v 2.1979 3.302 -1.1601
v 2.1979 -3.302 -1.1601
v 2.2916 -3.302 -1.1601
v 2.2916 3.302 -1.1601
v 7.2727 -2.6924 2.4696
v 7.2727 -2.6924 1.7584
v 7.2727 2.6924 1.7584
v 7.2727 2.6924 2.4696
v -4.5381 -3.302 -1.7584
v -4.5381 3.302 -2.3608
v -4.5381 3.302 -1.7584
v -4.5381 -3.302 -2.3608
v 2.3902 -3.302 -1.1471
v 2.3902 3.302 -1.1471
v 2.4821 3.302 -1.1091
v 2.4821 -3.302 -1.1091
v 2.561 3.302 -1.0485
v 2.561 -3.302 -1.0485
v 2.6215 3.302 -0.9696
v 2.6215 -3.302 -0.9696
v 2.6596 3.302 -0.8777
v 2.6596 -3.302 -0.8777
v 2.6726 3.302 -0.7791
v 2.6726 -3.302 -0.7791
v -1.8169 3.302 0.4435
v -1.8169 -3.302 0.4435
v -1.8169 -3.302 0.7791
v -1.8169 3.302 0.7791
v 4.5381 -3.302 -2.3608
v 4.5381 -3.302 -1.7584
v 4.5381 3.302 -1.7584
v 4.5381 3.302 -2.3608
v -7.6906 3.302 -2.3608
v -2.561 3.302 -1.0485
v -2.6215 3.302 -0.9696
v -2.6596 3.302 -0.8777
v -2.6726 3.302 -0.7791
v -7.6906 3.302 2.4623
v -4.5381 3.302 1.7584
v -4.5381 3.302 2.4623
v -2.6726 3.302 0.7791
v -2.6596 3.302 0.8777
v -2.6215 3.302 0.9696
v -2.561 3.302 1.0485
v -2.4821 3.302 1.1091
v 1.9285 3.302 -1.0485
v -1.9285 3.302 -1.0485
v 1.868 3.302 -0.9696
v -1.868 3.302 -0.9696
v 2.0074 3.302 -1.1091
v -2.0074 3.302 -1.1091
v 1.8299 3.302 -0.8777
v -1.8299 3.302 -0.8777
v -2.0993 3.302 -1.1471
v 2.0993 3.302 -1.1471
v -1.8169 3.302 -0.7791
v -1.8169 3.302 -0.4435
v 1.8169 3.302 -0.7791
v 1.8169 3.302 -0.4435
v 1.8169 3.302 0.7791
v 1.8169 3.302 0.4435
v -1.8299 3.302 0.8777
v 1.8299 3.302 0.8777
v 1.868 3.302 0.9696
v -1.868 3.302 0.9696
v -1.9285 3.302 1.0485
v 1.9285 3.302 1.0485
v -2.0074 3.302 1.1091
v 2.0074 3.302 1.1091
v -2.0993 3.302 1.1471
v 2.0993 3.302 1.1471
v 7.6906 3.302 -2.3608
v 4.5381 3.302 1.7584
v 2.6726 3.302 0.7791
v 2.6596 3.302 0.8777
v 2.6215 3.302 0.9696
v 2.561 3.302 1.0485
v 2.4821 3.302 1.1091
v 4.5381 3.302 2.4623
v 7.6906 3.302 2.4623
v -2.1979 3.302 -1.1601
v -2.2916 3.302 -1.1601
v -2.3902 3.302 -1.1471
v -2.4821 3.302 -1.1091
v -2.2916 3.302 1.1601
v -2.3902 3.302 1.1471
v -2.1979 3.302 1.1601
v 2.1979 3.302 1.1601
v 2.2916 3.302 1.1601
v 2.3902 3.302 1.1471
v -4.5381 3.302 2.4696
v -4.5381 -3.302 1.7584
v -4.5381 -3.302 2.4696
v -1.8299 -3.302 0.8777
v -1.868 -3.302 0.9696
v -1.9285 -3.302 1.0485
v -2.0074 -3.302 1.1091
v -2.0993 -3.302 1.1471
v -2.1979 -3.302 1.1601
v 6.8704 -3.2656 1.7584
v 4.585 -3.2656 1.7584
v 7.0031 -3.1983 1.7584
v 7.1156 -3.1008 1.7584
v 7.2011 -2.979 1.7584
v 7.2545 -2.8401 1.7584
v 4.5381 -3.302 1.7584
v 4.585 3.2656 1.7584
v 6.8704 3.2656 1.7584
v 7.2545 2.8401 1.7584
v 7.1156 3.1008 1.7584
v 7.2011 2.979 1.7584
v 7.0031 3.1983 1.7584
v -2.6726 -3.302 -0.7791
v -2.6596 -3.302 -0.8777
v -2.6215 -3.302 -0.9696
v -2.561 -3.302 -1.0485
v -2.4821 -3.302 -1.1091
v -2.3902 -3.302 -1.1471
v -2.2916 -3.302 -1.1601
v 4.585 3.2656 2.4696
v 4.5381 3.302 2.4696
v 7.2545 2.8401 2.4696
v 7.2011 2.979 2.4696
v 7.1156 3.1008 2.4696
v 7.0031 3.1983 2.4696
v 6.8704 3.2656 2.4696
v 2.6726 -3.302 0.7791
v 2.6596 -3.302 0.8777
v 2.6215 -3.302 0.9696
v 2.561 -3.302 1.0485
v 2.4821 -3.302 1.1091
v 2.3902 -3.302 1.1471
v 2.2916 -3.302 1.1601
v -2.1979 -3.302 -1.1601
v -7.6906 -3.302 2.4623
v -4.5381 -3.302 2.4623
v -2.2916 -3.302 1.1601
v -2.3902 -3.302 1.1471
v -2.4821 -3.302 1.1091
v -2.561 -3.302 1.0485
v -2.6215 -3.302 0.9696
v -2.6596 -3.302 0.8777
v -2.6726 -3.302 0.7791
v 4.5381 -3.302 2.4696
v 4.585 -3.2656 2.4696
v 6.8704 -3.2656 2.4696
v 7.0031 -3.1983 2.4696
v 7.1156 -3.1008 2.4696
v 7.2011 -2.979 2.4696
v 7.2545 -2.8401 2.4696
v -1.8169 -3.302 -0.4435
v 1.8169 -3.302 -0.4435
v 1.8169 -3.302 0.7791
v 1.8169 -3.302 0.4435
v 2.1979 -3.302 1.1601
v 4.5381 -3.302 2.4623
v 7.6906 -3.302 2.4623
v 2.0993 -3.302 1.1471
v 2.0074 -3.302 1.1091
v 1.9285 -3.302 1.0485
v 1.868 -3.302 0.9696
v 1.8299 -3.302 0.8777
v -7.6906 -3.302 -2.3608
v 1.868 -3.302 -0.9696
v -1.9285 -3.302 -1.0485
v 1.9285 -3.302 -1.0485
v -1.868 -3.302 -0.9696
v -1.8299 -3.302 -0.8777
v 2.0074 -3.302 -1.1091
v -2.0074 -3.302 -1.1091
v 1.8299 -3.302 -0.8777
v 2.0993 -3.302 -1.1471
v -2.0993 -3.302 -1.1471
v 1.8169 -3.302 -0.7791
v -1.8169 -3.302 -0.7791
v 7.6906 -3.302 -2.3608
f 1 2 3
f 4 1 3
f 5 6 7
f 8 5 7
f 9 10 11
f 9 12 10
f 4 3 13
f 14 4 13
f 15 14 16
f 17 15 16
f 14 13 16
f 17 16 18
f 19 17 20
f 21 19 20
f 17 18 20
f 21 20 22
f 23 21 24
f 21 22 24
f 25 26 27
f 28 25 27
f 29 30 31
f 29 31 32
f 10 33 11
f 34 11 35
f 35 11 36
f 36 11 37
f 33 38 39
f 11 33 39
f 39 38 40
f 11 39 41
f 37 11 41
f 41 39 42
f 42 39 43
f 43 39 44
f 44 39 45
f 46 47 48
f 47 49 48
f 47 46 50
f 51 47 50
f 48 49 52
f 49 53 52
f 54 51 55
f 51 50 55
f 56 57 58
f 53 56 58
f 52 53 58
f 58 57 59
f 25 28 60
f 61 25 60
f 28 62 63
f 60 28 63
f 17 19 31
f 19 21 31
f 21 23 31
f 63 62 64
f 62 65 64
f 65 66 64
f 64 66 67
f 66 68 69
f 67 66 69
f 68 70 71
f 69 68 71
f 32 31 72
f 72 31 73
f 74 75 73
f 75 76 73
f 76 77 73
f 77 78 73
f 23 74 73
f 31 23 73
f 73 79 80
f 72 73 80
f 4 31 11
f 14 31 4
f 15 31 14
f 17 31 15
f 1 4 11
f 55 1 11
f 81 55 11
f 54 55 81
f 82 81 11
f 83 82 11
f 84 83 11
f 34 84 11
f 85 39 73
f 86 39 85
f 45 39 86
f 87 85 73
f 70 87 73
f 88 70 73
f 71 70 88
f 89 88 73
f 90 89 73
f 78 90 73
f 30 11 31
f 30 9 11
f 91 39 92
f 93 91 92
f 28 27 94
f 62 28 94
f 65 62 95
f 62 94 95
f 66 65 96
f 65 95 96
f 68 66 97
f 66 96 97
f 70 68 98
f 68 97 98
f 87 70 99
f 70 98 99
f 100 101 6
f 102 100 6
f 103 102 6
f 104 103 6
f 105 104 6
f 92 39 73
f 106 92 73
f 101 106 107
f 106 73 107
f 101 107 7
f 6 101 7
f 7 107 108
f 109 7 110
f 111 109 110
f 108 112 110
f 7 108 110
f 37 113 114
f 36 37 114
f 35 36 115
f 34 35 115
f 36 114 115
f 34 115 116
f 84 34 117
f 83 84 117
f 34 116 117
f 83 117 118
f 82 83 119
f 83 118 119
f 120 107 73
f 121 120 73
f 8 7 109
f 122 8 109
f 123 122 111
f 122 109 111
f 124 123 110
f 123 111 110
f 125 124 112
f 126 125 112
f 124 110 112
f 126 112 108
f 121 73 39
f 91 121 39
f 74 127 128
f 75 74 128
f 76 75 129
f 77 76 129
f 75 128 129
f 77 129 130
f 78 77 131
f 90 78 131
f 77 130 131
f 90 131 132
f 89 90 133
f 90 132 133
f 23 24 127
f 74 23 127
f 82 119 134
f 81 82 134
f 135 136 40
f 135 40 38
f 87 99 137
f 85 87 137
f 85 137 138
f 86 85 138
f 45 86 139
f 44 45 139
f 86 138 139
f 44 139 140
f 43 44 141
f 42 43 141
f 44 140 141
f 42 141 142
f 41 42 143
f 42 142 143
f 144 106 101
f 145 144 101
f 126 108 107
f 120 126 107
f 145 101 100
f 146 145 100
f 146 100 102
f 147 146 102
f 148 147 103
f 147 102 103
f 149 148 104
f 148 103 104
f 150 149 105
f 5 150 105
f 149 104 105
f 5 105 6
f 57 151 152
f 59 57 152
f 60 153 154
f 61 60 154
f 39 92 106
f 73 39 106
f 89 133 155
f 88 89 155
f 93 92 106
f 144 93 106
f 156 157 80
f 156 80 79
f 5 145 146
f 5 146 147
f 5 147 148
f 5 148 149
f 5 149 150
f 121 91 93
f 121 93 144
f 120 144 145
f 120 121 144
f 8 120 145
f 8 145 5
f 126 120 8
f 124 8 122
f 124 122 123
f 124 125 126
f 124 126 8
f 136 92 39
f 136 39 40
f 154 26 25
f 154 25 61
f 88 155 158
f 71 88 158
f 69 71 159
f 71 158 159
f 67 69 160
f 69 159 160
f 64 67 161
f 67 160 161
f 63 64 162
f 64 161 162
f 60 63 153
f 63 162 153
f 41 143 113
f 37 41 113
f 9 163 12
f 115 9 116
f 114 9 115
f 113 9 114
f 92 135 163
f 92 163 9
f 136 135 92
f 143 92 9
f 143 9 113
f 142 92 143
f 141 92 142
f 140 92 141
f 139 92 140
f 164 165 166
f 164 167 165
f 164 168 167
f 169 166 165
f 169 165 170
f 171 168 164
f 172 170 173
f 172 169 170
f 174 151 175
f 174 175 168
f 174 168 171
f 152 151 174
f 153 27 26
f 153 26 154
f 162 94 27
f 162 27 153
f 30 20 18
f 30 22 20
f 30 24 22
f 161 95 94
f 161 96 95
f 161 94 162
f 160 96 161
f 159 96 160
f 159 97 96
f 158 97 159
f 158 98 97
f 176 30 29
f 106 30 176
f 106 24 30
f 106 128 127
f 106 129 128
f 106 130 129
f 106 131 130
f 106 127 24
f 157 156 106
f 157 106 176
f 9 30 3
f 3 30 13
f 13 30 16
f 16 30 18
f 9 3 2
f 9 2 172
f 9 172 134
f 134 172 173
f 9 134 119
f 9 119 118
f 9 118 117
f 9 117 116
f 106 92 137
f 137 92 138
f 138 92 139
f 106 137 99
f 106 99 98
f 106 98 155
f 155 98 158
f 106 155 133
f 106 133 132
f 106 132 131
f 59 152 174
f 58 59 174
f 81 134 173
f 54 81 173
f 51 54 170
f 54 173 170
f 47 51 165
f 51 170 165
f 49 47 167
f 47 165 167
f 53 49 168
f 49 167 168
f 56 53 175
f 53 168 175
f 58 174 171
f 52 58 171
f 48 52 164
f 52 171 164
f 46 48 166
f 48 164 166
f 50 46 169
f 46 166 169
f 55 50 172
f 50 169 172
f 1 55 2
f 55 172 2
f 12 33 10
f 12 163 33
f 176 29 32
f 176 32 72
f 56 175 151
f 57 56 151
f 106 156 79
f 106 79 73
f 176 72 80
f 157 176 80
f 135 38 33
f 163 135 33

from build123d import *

# Parameters (mm, degrees)
F0_W          = 9.076156
F0_H          = 3.516816
F1_DEPTH      = 3.302
F1_DEPTH_BACK = 3.302
F2_W          = 3.633868
F2_H          = 0.886982
F3_DEPTH      = 6.8072
F5_DEPTH      = 0.7112


with BuildPart() as f1:
    # F0 (on Front) → F1 (new body, two sides)
    with BuildSketch(Plane.XZ) as f1_sk:
        Rectangle(F0_W, F0_H)
        Polygon((4.538078, 1.758408), (4.538078, -1.758408), (4.538078, -2.360844), (7.690614, -2.360844), (7.690614, 2.46226), (4.538078, 2.46226), align=None)
        Polygon((-4.538078, -2.360844), (-4.538078, -1.758408), (-4.538078, 1.758408), (-4.538078, 2.46226), (-7.690614, 2.46226), (-7.690614, -2.360844), align=None)
    extrude(amount=F1_DEPTH)
    extrude(f1_sk.sketch, amount=-F1_DEPTH_BACK)

    # F2 (on face) → F3 (cut)
    with BuildSketch(Plane.XZ.offset(3.302)):
        Rectangle(F2_W, F2_H)
        with BuildLine():
            Line((1.816934, 0.443491), (1.816934, -0.443491))
            Line((1.816934, -0.443491), (1.816934, -0.779099))
            ThreePointArc((1.816934, -0.779099), (1.928526, -1.048507), (2.197934, -1.160099))
            Line((2.197934, -1.160099), (2.291586, -1.160099))
            ThreePointArc((2.291586, -1.160099), (2.560993, -1.048507), (2.672586, -0.779099))
            Line((2.672586, -0.779099), (2.672586, 0.779099))
            ThreePointArc((2.672586, 0.779099), (2.560993, 1.048507), (2.291586, 1.160099))
            Line((2.291586, 1.160099), (2.197934, 1.160099))
            ThreePointArc((2.197934, 1.160099), (1.928526, 1.048507), (1.816934, 0.779099))
            Line((1.816934, 0.779099), (1.816934, 0.443491))
        make_face()
        with BuildLine():
            Line((-1.816934, -0.779099), (-1.816934, -0.443491))
            Line((-1.816934, -0.443491), (-1.816934, 0.443491))
            Line((-1.816934, 0.443491), (-1.816934, 0.779099))
            ThreePointArc((-1.816934, 0.779099), (-1.928526, 1.048507), (-2.197934, 1.160099))
            Line((-2.197934, 1.160099), (-2.291586, 1.160099))
            ThreePointArc((-2.291586, 1.160099), (-2.560993, 1.048507), (-2.672586, 0.779099))
            Line((-2.672586, 0.779099), (-2.672586, -0.779099))
            ThreePointArc((-2.672586, -0.779099), (-2.560993, -1.048507), (-2.291586, -1.160099))
            Line((-2.291586, -1.160099), (-2.197934, -1.160099))
            ThreePointArc((-2.197934, -1.160099), (-1.928526, -1.048507), (-1.816934, -0.779099))
        make_face()
    extrude(amount=-F3_DEPTH, mode=Mode.SUBTRACT)


with BuildPart() as f5:
    # F4 (on face) → F5 (new body)
    with BuildSketch(Plane.XY.offset(1.758408)):
        with BuildLine():
            Line((4.538078, 3.302), (-4.538078, 3.302))
            Line((-4.538078, 3.302), (-4.538078, -3.302))
            Line((-4.538078, -3.302), (4.538078, -3.302))
            Line((4.538078, -3.302), (4.585049, -3.265647))
            Line((4.585049, -3.265647), (6.870424, -3.265647))
            ThreePointArc((6.870424, -3.265647), (7.162069, -3.042545), (7.272659, -2.6924))
            Line((7.272659, -2.6924), (7.272659, 2.6924))
            ThreePointArc((7.272659, 2.6924), (7.162069, 3.042545), (6.870424, 3.265647))
            Line((6.870424, 3.265647), (4.585049, 3.265647))
            Line((4.585049, 3.265647), (4.538078, 3.302))
        make_face()
    extrude(amount=F5_DEPTH)


solid = Compound([f1.part, f5.part])
